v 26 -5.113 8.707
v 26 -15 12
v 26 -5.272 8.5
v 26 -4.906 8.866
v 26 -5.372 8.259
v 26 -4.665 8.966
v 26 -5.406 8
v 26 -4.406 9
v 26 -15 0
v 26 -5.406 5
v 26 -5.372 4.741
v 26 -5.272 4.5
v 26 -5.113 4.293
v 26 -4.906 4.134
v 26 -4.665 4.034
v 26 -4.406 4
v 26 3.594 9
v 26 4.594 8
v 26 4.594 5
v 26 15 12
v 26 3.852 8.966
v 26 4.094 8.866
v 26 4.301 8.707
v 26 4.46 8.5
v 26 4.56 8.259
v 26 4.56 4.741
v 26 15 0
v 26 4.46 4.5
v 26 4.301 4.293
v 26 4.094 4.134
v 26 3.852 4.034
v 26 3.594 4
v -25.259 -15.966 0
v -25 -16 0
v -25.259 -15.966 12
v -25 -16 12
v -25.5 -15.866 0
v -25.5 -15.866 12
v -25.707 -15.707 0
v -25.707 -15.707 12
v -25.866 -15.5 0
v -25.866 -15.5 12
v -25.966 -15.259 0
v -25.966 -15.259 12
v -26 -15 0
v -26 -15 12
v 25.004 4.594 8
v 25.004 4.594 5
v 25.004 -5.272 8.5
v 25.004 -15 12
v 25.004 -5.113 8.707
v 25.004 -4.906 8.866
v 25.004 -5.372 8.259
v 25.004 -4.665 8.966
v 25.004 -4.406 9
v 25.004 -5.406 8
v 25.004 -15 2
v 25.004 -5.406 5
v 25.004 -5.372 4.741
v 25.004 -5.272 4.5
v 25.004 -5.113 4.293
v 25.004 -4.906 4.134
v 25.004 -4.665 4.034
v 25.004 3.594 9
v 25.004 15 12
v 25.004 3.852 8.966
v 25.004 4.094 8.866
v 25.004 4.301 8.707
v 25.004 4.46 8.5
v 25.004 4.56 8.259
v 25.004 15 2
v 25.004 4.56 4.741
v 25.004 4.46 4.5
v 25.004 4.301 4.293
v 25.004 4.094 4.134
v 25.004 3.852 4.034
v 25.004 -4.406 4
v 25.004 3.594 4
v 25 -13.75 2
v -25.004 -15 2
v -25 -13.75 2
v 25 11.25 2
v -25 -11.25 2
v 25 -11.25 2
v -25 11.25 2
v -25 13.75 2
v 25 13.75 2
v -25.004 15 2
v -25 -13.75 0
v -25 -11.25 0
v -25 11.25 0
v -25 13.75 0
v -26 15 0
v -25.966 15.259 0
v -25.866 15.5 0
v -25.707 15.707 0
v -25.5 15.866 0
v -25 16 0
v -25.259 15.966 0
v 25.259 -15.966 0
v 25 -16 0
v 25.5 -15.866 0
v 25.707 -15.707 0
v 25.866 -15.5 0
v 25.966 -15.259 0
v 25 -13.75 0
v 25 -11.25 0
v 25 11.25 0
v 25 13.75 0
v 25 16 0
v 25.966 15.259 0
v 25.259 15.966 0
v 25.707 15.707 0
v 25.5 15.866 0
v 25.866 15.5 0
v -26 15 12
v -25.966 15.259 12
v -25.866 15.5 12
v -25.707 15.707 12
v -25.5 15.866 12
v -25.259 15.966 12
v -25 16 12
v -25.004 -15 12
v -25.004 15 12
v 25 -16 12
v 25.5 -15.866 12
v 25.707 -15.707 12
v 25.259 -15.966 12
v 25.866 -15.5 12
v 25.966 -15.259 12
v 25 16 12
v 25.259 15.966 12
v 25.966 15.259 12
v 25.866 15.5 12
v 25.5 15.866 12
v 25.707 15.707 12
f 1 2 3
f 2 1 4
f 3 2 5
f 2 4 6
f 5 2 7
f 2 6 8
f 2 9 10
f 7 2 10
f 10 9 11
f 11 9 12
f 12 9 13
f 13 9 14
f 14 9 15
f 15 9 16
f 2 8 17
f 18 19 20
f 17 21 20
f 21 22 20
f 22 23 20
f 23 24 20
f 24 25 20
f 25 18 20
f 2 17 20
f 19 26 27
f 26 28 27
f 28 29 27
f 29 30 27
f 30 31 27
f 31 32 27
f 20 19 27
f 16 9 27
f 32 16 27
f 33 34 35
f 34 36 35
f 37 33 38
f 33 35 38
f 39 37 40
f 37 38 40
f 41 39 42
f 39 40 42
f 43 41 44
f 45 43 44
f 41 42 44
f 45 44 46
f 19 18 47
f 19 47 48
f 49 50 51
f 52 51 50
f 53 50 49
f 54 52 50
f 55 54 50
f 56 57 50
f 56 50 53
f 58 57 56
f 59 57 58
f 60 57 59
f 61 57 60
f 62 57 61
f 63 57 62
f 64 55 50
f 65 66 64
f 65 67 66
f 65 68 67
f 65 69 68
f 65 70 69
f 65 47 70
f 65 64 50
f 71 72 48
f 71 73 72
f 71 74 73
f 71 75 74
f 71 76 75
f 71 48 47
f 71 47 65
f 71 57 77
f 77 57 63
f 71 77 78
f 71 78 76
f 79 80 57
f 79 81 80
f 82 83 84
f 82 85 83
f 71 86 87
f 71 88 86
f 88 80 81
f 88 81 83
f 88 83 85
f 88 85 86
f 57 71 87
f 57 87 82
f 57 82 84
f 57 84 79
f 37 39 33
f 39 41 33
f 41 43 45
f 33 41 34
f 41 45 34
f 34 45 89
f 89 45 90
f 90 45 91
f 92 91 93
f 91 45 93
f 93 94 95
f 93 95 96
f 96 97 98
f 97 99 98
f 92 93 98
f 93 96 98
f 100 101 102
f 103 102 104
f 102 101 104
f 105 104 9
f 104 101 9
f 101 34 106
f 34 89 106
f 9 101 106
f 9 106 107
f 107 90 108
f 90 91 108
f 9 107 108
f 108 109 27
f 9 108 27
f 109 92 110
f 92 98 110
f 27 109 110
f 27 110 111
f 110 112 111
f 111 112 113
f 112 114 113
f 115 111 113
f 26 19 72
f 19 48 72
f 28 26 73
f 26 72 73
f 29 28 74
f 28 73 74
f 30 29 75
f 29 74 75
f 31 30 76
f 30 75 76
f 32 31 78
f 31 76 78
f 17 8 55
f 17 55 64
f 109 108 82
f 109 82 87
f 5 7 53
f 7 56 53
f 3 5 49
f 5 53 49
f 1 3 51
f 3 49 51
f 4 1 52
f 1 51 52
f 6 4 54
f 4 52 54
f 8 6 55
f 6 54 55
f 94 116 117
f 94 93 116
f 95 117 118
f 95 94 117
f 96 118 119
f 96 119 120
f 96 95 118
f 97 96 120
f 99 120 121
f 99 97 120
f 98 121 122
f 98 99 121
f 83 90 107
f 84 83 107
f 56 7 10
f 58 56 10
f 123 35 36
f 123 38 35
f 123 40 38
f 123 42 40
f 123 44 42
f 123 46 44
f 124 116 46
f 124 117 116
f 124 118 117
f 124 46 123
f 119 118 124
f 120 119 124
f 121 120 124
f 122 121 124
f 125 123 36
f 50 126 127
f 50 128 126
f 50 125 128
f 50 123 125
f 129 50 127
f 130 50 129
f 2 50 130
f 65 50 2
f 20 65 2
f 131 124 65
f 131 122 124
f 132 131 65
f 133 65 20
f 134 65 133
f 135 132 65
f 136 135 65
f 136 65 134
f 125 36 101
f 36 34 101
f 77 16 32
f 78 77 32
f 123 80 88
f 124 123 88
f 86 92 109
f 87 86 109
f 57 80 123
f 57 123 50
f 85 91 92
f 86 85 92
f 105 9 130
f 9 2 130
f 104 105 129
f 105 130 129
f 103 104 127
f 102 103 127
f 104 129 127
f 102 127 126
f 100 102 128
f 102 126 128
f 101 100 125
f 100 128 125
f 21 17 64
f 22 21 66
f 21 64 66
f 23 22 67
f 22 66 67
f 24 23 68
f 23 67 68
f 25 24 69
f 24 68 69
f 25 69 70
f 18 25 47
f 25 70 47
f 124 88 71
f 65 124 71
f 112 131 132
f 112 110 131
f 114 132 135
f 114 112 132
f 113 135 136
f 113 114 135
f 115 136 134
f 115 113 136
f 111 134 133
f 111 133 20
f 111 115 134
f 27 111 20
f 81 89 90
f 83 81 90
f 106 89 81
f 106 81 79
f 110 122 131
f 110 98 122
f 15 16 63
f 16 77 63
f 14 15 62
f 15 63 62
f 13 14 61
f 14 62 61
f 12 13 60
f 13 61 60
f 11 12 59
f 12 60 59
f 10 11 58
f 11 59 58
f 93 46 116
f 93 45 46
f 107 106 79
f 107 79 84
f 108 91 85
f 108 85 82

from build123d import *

# Parameters (mm, degrees)
SKETCH1_W           = 52
SKETCH1_H           = 32
SKETCH1_W_2         = 50
SKETCH1_H_2         = 2.5
BOSS_EXTRUDE1_DEPTH = 2
SKETCH2_W           = 52
SKETCH2_H           = 32
SKETCH2_W_2         = 50.00793432
SKETCH2_H_2         = 30
BOSS_EXTRUDE2_DEPTH = 10
SKETCH3_W           = 5
SKETCH3_H           = 10
CUT_EXTRUDE1_DEPTH  = 10
FILLET1_R           = 1
FILLET2_R           = 1
FILLET3_R           = 1
FILLET4_R           = 1
FILLET5_R           = 1
FILLET6_R           = 1
FILLET7_R           = 1
FILLET8_R           = 1


with BuildPart() as part:
    # Sketch1 → Boss-Extrude1 (new body)
    with BuildSketch(Plane.XY):
        Rectangle(SKETCH1_W, SKETCH1_H)
        with Locations((0, 12.5)):
            Rectangle(SKETCH1_W_2, SKETCH1_H_2, mode=Mode.SUBTRACT)
        with Locations((0, -12.5)):
            Rectangle(SKETCH1_W_2, SKETCH1_H_2, mode=Mode.SUBTRACT)
    extrude(amount=BOSS_EXTRUDE1_DEPTH)

    # Sketch2 → Boss-Extrude2 (add)
    with BuildSketch(Plane.XY.offset(2)):
        Rectangle(SKETCH2_W, SKETCH2_H)
        Rectangle(SKETCH2_W_2, SKETCH2_H_2, mode=Mode.SUBTRACT)
    extrude(amount=BOSS_EXTRUDE2_DEPTH)

    # Sketch3 → Cut-Extrude1 (cut)
    with BuildSketch(Plane(origin=(26, 0, 0), x_dir=(0, 0, -1), z_dir=(1, 0, 0))):
        with Locations((-6.5, -0.40632889)):
            Rectangle(SKETCH3_W, SKETCH3_H)
    extrude(amount=-CUT_EXTRUDE1_DEPTH, mode=Mode.SUBTRACT)

    # Fillet1
    fillet1_edges = [part.edges().sort_by_distance(p)[0] for p in [
        (26, 16, 6),
    ]]
    fillet(fillet1_edges, radius=FILLET1_R)

    # Fillet2
    fillet2_edges = [part.edges().sort_by_distance(p)[0] for p in [
        (26, -16, 6),
    ]]
    fillet(fillet2_edges, radius=FILLET2_R)

    # Fillet3
    fillet3_edges = [part.edges().sort_by_distance(p)[0] for p in [
        (-26, -16, 6),
    ]]
    fillet(fillet3_edges, radius=FILLET3_R)

    # Fillet4
    fillet4_edges = [part.edges().sort_by_distance(p)[0] for p in [
        (-26, 16, 6),
    ]]
    fillet(fillet4_edges, radius=FILLET4_R)

    # Fillet5
    fillet5_edges = [part.edges().sort_by_distance(p)[0] for p in [
        (25.50198358, 4.59367111, 4),
    ]]
    fillet(fillet5_edges, radius=FILLET5_R)

    # Fillet6
    fillet6_edges = [part.edges().sort_by_distance(p)[0] for p in [
        (25.50198358, -5.40632889, 4),
    ]]
    fillet(fillet6_edges, radius=FILLET6_R)

    # Fillet7
    fillet7_edges = [part.edges().sort_by_distance(p)[0] for p in [
        (25.50198358, -5.40632889, 9),
    ]]
    fillet(fillet7_edges, radius=FILLET7_R)

    # Fillet8
    fillet8_edges = [part.edges().sort_by_distance(p)[0] for p in [
        (25.50198358, 4.59367111, 9),
    ]]
    fillet(fillet8_edges, radius=FILLET8_R)


solid = part.part
